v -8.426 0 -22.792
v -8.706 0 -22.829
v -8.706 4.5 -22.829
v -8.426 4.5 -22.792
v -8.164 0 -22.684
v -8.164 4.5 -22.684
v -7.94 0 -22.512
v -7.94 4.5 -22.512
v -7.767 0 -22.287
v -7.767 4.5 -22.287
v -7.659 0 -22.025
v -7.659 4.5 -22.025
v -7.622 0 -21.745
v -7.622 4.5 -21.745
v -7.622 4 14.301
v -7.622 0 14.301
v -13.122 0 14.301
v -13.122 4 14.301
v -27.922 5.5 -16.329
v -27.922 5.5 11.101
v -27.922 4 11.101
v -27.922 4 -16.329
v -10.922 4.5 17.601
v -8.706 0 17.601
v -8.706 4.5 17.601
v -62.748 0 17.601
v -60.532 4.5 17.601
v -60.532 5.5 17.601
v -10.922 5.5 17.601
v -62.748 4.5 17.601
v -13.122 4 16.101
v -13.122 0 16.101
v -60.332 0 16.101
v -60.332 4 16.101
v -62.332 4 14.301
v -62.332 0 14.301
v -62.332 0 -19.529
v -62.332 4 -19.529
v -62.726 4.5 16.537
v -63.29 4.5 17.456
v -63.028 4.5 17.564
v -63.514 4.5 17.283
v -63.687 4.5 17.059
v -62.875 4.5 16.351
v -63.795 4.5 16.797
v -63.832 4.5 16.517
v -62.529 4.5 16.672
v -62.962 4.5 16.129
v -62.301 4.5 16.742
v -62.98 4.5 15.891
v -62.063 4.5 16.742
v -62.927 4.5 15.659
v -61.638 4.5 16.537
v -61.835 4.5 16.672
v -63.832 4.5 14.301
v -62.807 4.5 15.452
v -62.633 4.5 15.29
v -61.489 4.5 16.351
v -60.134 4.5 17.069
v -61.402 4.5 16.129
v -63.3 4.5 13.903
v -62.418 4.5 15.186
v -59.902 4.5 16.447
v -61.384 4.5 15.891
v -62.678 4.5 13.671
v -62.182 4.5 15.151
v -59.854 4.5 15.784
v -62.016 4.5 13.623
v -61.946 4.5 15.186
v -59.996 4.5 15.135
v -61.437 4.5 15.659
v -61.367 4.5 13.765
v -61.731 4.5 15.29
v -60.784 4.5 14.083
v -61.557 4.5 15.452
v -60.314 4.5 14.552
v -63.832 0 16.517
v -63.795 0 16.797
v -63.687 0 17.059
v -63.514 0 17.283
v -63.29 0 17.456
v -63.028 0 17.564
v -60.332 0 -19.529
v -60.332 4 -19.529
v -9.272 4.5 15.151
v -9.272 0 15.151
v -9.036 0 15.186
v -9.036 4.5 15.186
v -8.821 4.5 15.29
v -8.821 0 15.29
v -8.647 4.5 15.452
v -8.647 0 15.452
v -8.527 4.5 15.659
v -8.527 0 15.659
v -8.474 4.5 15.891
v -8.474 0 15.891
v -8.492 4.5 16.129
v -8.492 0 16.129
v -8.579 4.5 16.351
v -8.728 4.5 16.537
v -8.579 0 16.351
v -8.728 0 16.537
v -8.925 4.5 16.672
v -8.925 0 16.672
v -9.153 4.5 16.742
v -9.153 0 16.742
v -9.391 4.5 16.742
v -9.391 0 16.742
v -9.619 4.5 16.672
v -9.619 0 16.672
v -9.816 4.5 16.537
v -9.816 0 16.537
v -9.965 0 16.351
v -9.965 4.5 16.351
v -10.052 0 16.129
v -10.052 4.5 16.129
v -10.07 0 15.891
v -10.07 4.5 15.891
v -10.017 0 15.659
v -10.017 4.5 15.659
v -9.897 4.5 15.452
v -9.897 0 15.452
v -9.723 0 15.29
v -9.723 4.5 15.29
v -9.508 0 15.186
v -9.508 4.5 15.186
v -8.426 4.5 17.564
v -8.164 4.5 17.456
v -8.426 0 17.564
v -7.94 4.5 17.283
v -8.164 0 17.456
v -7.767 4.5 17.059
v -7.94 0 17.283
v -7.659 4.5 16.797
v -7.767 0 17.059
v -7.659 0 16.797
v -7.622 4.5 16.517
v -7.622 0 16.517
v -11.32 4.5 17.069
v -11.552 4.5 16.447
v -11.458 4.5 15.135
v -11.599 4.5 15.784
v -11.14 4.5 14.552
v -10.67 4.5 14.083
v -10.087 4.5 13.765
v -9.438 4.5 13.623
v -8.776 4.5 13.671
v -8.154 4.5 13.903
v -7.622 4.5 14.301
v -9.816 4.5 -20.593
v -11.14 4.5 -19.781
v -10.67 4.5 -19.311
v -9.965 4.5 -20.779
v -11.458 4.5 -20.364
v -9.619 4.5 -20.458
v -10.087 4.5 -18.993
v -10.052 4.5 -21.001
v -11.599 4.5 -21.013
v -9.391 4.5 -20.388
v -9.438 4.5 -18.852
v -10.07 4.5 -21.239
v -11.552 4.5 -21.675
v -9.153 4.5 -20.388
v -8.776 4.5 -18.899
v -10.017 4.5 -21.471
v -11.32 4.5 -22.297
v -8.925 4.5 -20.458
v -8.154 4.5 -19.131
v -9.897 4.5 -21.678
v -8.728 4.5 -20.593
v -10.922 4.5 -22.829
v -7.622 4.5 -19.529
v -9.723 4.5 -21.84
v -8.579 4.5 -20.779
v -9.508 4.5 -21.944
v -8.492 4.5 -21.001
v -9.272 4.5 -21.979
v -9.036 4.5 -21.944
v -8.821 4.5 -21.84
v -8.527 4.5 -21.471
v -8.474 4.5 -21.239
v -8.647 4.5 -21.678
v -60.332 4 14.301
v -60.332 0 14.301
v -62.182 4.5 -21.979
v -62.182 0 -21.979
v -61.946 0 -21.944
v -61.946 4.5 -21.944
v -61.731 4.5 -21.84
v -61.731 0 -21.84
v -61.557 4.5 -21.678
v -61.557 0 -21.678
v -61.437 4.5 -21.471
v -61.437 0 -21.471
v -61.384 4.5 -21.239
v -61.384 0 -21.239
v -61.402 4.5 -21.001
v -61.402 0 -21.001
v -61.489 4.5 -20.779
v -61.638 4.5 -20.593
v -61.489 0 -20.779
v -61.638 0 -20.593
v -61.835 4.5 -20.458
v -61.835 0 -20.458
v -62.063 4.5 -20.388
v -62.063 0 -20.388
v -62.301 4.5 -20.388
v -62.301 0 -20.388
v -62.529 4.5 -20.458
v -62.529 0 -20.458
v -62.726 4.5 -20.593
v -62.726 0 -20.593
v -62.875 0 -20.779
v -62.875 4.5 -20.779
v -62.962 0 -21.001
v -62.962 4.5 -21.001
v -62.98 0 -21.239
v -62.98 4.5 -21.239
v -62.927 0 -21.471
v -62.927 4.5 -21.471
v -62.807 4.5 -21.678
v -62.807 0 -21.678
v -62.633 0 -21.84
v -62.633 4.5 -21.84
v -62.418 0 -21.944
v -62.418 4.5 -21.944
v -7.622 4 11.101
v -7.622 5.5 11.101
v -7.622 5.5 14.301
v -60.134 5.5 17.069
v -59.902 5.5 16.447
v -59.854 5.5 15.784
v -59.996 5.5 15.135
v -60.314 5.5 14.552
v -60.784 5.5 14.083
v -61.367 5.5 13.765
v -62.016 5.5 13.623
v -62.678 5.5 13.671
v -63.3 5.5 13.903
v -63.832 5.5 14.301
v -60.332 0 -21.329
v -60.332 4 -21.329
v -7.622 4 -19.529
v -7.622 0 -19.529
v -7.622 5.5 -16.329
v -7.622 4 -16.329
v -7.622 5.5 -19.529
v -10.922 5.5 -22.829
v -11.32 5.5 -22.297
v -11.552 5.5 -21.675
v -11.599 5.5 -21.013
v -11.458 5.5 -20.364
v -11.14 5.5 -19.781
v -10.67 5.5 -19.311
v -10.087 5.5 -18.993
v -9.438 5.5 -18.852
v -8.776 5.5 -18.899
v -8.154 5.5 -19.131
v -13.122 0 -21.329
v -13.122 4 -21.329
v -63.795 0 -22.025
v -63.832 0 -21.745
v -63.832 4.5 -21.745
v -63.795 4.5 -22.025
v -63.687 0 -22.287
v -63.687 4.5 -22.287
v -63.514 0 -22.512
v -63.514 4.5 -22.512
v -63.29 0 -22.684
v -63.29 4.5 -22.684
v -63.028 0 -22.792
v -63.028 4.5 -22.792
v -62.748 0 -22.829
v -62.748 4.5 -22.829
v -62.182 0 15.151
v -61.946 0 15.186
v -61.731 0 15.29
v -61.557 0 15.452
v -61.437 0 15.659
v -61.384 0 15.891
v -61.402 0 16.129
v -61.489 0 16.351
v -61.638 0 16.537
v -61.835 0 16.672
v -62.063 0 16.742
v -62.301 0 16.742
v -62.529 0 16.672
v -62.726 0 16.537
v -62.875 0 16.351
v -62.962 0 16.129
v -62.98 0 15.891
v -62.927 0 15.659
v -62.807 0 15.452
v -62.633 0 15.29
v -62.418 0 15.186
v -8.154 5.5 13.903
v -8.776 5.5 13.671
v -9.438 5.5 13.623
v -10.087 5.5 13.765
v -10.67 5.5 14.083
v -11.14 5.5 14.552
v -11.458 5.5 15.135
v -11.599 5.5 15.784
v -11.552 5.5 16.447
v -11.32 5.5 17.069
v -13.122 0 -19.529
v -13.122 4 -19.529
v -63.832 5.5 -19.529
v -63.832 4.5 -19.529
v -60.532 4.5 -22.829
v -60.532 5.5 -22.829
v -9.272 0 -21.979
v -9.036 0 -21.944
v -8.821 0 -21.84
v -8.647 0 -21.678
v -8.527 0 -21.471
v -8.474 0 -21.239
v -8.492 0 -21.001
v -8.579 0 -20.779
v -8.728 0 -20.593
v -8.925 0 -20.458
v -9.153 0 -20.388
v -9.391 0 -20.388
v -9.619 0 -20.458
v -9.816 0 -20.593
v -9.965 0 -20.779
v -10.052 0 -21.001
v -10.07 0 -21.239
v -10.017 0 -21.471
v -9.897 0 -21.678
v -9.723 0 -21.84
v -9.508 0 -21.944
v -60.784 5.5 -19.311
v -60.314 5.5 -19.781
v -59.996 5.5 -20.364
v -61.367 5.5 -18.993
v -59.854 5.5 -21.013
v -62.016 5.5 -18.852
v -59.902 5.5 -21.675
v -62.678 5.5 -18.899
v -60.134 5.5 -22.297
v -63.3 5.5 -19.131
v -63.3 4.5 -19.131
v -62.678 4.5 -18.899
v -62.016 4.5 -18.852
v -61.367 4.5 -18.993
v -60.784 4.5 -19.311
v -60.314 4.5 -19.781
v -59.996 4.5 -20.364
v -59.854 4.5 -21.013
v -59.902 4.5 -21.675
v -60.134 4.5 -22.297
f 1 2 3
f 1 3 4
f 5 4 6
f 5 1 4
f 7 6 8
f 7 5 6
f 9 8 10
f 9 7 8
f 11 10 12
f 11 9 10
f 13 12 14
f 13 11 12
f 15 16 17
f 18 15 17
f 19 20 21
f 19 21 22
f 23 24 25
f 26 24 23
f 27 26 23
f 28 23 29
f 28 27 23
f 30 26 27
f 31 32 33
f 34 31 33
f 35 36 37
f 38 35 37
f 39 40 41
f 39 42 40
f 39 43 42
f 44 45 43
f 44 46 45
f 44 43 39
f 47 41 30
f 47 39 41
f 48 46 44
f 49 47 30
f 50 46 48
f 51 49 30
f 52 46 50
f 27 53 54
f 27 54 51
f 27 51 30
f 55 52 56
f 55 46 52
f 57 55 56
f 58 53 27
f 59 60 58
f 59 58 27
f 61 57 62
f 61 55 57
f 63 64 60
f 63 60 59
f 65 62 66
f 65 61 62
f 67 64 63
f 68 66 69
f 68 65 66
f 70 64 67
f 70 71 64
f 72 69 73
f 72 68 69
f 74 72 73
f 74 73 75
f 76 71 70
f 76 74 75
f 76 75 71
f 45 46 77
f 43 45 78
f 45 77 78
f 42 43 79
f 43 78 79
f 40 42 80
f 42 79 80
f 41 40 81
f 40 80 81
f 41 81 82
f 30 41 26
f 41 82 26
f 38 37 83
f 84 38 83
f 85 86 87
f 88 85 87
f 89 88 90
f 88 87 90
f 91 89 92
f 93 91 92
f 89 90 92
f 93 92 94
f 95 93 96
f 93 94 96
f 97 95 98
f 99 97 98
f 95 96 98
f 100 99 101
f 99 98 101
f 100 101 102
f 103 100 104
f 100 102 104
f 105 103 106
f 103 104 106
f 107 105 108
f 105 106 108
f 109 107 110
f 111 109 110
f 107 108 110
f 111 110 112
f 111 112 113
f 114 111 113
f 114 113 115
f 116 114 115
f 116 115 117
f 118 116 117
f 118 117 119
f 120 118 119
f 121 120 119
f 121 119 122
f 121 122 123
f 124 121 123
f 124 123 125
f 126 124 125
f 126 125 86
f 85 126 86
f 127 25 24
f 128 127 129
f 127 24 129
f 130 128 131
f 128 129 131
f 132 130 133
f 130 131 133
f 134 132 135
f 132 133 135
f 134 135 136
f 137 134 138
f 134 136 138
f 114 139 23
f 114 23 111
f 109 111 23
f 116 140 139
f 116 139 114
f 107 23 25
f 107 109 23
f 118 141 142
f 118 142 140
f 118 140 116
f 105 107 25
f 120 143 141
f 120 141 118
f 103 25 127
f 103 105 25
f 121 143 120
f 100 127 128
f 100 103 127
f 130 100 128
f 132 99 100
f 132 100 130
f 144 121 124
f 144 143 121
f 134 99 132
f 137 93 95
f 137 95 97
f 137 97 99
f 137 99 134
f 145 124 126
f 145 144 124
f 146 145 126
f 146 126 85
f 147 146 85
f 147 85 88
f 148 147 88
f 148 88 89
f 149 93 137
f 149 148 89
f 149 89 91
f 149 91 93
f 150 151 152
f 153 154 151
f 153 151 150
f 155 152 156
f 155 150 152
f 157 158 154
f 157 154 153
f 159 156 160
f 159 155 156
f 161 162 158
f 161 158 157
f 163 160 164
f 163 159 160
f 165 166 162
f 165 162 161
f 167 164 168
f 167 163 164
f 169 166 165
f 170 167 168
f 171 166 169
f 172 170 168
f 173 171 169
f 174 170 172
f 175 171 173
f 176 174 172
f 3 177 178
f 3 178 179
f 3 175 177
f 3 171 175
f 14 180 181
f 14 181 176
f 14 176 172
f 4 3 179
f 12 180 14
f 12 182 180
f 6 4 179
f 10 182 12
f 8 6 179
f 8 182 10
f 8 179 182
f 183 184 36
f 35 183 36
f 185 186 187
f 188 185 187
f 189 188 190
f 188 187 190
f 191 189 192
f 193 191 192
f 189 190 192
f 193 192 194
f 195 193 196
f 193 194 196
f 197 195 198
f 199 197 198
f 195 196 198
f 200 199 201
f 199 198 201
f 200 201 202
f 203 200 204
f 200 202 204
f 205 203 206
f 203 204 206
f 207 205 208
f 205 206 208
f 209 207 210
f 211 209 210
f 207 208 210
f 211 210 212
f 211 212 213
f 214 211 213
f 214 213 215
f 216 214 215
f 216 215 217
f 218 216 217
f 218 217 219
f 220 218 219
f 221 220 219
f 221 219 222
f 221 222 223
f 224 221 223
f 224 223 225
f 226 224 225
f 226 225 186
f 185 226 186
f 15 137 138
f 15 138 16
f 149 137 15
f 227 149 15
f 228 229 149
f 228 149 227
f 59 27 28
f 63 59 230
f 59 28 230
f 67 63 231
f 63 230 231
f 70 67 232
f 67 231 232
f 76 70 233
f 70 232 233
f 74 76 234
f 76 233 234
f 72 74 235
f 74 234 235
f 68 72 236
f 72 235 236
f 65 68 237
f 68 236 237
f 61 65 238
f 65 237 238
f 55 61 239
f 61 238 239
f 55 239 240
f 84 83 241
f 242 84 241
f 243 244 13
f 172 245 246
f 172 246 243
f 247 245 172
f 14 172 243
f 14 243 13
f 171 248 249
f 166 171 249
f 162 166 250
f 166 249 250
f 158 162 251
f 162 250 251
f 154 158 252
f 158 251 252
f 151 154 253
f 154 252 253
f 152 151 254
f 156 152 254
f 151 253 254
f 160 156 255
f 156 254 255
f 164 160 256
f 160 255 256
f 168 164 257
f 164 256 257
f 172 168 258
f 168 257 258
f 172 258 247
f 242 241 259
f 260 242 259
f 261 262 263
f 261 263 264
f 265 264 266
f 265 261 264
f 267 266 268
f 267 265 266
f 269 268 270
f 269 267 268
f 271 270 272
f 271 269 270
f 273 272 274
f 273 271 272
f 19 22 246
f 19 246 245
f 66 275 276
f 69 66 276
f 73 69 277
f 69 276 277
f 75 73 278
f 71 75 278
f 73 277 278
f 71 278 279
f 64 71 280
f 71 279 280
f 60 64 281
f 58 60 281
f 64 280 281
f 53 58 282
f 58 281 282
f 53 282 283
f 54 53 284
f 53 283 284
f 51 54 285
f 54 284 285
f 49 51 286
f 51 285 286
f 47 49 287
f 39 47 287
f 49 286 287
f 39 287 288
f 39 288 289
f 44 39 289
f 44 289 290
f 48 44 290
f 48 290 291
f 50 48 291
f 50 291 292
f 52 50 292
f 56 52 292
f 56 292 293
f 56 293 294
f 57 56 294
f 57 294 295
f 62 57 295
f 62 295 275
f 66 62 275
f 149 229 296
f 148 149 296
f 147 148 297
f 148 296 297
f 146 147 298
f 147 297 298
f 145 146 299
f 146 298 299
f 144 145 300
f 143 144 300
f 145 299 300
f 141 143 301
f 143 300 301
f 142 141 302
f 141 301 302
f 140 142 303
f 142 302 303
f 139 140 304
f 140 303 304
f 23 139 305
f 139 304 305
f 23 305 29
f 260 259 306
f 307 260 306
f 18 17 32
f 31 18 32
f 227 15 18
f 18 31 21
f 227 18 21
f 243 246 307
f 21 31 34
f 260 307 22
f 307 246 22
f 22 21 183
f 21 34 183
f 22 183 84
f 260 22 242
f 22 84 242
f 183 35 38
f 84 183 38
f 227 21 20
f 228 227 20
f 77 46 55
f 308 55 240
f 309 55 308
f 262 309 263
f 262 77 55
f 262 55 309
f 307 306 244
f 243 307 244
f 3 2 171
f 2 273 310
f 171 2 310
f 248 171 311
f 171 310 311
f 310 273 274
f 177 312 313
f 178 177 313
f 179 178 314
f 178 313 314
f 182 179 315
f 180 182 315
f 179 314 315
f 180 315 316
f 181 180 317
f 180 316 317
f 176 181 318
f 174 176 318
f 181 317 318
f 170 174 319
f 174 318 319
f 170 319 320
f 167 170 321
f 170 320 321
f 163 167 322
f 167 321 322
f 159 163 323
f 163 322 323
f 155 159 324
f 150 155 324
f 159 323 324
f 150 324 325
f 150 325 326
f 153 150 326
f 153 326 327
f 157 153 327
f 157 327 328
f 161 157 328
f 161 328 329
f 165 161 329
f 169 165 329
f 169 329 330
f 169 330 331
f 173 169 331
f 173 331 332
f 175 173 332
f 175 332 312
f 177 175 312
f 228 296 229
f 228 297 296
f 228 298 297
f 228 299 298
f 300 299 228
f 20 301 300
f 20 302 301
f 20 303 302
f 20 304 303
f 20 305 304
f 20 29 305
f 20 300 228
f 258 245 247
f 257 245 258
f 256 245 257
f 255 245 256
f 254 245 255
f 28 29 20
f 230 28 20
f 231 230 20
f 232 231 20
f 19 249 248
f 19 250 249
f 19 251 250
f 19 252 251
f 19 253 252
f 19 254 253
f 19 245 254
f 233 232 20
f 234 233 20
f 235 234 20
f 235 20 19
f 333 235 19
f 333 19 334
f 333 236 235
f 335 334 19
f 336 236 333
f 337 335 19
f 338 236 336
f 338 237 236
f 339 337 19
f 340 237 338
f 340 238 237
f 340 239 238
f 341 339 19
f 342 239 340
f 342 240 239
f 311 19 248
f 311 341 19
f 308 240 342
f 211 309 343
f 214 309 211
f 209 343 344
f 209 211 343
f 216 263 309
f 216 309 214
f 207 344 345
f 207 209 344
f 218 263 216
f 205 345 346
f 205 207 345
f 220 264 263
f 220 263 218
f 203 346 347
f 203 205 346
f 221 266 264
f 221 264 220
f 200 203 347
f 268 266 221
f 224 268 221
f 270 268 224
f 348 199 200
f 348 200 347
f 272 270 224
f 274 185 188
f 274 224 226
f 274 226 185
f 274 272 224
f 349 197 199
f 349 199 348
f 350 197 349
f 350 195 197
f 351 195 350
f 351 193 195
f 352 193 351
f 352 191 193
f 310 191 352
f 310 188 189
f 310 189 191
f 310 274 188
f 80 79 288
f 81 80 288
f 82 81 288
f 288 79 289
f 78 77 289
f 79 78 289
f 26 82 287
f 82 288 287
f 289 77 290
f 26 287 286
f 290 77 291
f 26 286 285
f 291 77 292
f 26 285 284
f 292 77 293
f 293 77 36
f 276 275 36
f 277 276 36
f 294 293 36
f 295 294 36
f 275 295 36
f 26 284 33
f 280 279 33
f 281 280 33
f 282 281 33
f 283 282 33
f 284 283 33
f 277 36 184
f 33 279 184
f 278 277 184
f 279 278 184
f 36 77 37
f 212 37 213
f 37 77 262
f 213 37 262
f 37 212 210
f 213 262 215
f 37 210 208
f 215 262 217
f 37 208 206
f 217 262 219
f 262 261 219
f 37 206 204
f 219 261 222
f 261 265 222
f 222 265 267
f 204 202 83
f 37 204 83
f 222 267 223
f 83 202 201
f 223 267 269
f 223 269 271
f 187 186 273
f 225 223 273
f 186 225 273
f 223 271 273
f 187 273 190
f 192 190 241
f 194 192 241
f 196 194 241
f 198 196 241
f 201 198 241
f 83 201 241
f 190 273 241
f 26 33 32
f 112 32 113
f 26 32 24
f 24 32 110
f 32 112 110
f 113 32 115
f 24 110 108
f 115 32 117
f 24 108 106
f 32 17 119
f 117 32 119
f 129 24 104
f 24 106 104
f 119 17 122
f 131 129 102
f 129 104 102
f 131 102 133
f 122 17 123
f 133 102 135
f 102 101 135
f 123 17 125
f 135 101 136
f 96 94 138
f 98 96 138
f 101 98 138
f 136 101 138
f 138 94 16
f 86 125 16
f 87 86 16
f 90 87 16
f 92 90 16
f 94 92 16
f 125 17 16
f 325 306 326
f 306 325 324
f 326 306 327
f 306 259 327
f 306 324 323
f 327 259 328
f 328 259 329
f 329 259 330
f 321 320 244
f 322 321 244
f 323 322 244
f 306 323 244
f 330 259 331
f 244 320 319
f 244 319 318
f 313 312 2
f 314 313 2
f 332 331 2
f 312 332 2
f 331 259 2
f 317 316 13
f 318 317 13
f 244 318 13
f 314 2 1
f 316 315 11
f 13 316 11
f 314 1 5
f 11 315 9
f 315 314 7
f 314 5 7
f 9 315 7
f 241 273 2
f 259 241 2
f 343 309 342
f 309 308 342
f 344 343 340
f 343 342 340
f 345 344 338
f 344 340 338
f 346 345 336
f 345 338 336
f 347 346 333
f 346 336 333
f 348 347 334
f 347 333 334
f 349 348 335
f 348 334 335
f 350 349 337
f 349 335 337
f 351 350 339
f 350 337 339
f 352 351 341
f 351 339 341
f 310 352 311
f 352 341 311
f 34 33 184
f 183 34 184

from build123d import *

# Parameters (mm, degrees)
EXTRUDE_1_DEPTH     = 4
SKETCH_2_W          = 1.5
SKETCH_2_H          = 40.43
EXTRUDE_2_DEPTH     = 1.5
SKETCH_3_W          = 40.43
SKETCH_3_H          = 1.5
EXTRUDE_5_DEPTH     = 54.71
SKETCH_4_W          = 40.43
SKETCH_4_H          = 1.5
CUT_EXTRUDE_1_DEPTH = 20.3
SKETCH_5_W          = 6.5
SKETCH_5_H          = 1.5
EXTRUDE_6_DEPTH     = 20.3
SKETCH_6_R          = 0.8
CUT_EXTRUDE_2_DEPTH = 20.3
SKETCH_7_R          = 2.333452378
CUT_EXTRUDE_5_DEPTH = 1
CUT_EXTRUDE_6_DEPTH = 10


with BuildPart() as part:
    # 草图1 → 凸台-拉伸1 (new body)
    with BuildSketch(Plane(origin=(0, 0, 0), x_dir=(1, 0, 0), z_dir=(0, 1, 0))):
        Polygon((-13.121987947, 19.52916985), (-7.621987947, 19.52916985), (-7.621987947, 22.82916985), (-63.831987947, 22.82916985), (-63.831987947, -17.60083015), (-7.621987947, -17.60083015), (-7.621987947, -14.30083015), (-13.121987947, -14.30083015), (-13.121987947, -16.10083015), (-60.331987947, -16.10083015), (-60.331987947, -14.30083015), (-62.331987947, -14.30083015), (-62.331987947, 19.52916985), (-60.331987947, 19.52916985), (-60.331987947, 21.32916985), (-13.121987947, 21.32916985), align=None)
    extrude(amount=EXTRUDE_1_DEPTH)

    # 草图2 → 凸台-拉伸2 (add)
    with BuildSketch(Plane(origin=(0, 4, 0), x_dir=(1, 0, 0), z_dir=(0, 1, 0))):
        with Locations((-63.081987947, 2.61416985)):
            Rectangle(SKETCH_2_W, SKETCH_2_H)
    extrude(amount=EXTRUDE_2_DEPTH)

    # 草图3 → 凸台-拉伸5 (add)
    with BuildSketch(Plane(origin=(-62.331987947, 0, 0), x_dir=(0, 0, -1), z_dir=(1, 0, 0))):
        with Locations((2.61416985, 4.75)):
            Rectangle(SKETCH_3_W, SKETCH_3_H)
    extrude(amount=EXTRUDE_5_DEPTH)

    # 草图4 → 切除-拉伸1 (cut)
    with BuildSketch(Plane(origin=(-7.621987947, 0, 0), x_dir=(0, 0, -1), z_dir=(1, 0, 0))):
        with Locations((2.61416985, 4.75)):
            Rectangle(SKETCH_4_W, SKETCH_4_H)
    extrude(amount=-CUT_EXTRUDE_1_DEPTH, mode=Mode.SUBTRACT)

    # 草图5 → 凸台-拉伸6 (add)
    with BuildSketch(Plane(origin=(-27.921987947, 0, 0), x_dir=(0, 0, -1), z_dir=(1, 0, 0))):
        with Locations((-14.35083015, 4.75)):
            Rectangle(SKETCH_5_W, SKETCH_5_H)
        with Locations((19.57916985, 4.75)):
            Rectangle(SKETCH_5_W, SKETCH_5_H)
    extrude(amount=EXTRUDE_6_DEPTH)

    # 草图6 → 切除-拉伸2 (cut)
    with BuildSketch(Plane.XZ):
        with Locations(Location((-9.271987947, -21.17916985, 0), (0, 0, 270))):
            Circle(SKETCH_6_R)
        with Locations(Location((-9.271987947, 15.95083015, 0), (0, 0, 270))):
            Circle(SKETCH_6_R)
        with Locations(Location((-62.181987947, 15.95083015, 0), (0, 0, 270))):
            Circle(SKETCH_6_R)
        with Locations(Location((-62.181987947, -21.17916985, 0), (0, 0, 270))):
            Circle(SKETCH_6_R)
    extrude(amount=-CUT_EXTRUDE_2_DEPTH, mode=Mode.SUBTRACT)

    # 草图7 → 切除-拉伸5 (cut)
    with BuildSketch(Plane(origin=(0, 5.5, 0), x_dir=(1, 0, 0), z_dir=(0, 1, 0))):
        with Locations((-62.181987947, -15.95083015)):
            Circle(SKETCH_7_R)
        with Locations((-62.181987947, 21.17916985)):
            Circle(SKETCH_7_R)
        with Locations((-9.271987947, 21.17916985)):
            Circle(SKETCH_7_R)
        with Locations((-9.271987947, -15.95083015)):
            Circle(SKETCH_7_R)
    extrude(amount=-CUT_EXTRUDE_5_DEPTH, mode=Mode.SUBTRACT)

    # 草图9 → 切除-拉伸6 (cut)
    with BuildSketch(Plane.XZ):
        with BuildLine():
            Line((-62.747673372, -22.82916985), (-63.831987947, -22.82916985))
            Line((-63.831987947, -22.82916985), (-63.831987947, -21.744855275))
            ThreePointArc((-63.831987947, -21.744855275), (-63.514399561, -22.511581464), (-62.747673372, -22.82916985))
        make_face()
        with BuildLine():
            Line((-62.747673372, 17.60083015), (-63.831987947, 17.60083015))
            Line((-63.831987947, 17.60083015), (-63.831987947, 16.516515575))
            ThreePointArc((-63.831987947, 16.516515575), (-63.514399561, 17.283241764), (-62.747673372, 17.60083015))
        make_face()
        with BuildLine():
            Line((-7.621987947, 16.516515575), (-7.621987947, 17.60083015))
            Line((-7.621987947, 17.60083015), (-8.706302522, 17.60083015))
            ThreePointArc((-8.706302522, 17.60083015), (-7.939576333, 17.283241764), (-7.621987947, 16.516515575))
        make_face()
        with BuildLine():
            Line((-7.621987947, -21.744855275), (-7.621987947, -22.82916985))
            Line((-7.621987947, -22.82916985), (-8.706302522, -22.82916985))
            ThreePointArc((-8.706302522, -22.82916985), (-7.939576333, -22.511581464), (-7.621987947, -21.744855275))
        make_face()
    extrude(amount=-CUT_EXTRUDE_6_DEPTH, mode=Mode.SUBTRACT)


solid = part.part
